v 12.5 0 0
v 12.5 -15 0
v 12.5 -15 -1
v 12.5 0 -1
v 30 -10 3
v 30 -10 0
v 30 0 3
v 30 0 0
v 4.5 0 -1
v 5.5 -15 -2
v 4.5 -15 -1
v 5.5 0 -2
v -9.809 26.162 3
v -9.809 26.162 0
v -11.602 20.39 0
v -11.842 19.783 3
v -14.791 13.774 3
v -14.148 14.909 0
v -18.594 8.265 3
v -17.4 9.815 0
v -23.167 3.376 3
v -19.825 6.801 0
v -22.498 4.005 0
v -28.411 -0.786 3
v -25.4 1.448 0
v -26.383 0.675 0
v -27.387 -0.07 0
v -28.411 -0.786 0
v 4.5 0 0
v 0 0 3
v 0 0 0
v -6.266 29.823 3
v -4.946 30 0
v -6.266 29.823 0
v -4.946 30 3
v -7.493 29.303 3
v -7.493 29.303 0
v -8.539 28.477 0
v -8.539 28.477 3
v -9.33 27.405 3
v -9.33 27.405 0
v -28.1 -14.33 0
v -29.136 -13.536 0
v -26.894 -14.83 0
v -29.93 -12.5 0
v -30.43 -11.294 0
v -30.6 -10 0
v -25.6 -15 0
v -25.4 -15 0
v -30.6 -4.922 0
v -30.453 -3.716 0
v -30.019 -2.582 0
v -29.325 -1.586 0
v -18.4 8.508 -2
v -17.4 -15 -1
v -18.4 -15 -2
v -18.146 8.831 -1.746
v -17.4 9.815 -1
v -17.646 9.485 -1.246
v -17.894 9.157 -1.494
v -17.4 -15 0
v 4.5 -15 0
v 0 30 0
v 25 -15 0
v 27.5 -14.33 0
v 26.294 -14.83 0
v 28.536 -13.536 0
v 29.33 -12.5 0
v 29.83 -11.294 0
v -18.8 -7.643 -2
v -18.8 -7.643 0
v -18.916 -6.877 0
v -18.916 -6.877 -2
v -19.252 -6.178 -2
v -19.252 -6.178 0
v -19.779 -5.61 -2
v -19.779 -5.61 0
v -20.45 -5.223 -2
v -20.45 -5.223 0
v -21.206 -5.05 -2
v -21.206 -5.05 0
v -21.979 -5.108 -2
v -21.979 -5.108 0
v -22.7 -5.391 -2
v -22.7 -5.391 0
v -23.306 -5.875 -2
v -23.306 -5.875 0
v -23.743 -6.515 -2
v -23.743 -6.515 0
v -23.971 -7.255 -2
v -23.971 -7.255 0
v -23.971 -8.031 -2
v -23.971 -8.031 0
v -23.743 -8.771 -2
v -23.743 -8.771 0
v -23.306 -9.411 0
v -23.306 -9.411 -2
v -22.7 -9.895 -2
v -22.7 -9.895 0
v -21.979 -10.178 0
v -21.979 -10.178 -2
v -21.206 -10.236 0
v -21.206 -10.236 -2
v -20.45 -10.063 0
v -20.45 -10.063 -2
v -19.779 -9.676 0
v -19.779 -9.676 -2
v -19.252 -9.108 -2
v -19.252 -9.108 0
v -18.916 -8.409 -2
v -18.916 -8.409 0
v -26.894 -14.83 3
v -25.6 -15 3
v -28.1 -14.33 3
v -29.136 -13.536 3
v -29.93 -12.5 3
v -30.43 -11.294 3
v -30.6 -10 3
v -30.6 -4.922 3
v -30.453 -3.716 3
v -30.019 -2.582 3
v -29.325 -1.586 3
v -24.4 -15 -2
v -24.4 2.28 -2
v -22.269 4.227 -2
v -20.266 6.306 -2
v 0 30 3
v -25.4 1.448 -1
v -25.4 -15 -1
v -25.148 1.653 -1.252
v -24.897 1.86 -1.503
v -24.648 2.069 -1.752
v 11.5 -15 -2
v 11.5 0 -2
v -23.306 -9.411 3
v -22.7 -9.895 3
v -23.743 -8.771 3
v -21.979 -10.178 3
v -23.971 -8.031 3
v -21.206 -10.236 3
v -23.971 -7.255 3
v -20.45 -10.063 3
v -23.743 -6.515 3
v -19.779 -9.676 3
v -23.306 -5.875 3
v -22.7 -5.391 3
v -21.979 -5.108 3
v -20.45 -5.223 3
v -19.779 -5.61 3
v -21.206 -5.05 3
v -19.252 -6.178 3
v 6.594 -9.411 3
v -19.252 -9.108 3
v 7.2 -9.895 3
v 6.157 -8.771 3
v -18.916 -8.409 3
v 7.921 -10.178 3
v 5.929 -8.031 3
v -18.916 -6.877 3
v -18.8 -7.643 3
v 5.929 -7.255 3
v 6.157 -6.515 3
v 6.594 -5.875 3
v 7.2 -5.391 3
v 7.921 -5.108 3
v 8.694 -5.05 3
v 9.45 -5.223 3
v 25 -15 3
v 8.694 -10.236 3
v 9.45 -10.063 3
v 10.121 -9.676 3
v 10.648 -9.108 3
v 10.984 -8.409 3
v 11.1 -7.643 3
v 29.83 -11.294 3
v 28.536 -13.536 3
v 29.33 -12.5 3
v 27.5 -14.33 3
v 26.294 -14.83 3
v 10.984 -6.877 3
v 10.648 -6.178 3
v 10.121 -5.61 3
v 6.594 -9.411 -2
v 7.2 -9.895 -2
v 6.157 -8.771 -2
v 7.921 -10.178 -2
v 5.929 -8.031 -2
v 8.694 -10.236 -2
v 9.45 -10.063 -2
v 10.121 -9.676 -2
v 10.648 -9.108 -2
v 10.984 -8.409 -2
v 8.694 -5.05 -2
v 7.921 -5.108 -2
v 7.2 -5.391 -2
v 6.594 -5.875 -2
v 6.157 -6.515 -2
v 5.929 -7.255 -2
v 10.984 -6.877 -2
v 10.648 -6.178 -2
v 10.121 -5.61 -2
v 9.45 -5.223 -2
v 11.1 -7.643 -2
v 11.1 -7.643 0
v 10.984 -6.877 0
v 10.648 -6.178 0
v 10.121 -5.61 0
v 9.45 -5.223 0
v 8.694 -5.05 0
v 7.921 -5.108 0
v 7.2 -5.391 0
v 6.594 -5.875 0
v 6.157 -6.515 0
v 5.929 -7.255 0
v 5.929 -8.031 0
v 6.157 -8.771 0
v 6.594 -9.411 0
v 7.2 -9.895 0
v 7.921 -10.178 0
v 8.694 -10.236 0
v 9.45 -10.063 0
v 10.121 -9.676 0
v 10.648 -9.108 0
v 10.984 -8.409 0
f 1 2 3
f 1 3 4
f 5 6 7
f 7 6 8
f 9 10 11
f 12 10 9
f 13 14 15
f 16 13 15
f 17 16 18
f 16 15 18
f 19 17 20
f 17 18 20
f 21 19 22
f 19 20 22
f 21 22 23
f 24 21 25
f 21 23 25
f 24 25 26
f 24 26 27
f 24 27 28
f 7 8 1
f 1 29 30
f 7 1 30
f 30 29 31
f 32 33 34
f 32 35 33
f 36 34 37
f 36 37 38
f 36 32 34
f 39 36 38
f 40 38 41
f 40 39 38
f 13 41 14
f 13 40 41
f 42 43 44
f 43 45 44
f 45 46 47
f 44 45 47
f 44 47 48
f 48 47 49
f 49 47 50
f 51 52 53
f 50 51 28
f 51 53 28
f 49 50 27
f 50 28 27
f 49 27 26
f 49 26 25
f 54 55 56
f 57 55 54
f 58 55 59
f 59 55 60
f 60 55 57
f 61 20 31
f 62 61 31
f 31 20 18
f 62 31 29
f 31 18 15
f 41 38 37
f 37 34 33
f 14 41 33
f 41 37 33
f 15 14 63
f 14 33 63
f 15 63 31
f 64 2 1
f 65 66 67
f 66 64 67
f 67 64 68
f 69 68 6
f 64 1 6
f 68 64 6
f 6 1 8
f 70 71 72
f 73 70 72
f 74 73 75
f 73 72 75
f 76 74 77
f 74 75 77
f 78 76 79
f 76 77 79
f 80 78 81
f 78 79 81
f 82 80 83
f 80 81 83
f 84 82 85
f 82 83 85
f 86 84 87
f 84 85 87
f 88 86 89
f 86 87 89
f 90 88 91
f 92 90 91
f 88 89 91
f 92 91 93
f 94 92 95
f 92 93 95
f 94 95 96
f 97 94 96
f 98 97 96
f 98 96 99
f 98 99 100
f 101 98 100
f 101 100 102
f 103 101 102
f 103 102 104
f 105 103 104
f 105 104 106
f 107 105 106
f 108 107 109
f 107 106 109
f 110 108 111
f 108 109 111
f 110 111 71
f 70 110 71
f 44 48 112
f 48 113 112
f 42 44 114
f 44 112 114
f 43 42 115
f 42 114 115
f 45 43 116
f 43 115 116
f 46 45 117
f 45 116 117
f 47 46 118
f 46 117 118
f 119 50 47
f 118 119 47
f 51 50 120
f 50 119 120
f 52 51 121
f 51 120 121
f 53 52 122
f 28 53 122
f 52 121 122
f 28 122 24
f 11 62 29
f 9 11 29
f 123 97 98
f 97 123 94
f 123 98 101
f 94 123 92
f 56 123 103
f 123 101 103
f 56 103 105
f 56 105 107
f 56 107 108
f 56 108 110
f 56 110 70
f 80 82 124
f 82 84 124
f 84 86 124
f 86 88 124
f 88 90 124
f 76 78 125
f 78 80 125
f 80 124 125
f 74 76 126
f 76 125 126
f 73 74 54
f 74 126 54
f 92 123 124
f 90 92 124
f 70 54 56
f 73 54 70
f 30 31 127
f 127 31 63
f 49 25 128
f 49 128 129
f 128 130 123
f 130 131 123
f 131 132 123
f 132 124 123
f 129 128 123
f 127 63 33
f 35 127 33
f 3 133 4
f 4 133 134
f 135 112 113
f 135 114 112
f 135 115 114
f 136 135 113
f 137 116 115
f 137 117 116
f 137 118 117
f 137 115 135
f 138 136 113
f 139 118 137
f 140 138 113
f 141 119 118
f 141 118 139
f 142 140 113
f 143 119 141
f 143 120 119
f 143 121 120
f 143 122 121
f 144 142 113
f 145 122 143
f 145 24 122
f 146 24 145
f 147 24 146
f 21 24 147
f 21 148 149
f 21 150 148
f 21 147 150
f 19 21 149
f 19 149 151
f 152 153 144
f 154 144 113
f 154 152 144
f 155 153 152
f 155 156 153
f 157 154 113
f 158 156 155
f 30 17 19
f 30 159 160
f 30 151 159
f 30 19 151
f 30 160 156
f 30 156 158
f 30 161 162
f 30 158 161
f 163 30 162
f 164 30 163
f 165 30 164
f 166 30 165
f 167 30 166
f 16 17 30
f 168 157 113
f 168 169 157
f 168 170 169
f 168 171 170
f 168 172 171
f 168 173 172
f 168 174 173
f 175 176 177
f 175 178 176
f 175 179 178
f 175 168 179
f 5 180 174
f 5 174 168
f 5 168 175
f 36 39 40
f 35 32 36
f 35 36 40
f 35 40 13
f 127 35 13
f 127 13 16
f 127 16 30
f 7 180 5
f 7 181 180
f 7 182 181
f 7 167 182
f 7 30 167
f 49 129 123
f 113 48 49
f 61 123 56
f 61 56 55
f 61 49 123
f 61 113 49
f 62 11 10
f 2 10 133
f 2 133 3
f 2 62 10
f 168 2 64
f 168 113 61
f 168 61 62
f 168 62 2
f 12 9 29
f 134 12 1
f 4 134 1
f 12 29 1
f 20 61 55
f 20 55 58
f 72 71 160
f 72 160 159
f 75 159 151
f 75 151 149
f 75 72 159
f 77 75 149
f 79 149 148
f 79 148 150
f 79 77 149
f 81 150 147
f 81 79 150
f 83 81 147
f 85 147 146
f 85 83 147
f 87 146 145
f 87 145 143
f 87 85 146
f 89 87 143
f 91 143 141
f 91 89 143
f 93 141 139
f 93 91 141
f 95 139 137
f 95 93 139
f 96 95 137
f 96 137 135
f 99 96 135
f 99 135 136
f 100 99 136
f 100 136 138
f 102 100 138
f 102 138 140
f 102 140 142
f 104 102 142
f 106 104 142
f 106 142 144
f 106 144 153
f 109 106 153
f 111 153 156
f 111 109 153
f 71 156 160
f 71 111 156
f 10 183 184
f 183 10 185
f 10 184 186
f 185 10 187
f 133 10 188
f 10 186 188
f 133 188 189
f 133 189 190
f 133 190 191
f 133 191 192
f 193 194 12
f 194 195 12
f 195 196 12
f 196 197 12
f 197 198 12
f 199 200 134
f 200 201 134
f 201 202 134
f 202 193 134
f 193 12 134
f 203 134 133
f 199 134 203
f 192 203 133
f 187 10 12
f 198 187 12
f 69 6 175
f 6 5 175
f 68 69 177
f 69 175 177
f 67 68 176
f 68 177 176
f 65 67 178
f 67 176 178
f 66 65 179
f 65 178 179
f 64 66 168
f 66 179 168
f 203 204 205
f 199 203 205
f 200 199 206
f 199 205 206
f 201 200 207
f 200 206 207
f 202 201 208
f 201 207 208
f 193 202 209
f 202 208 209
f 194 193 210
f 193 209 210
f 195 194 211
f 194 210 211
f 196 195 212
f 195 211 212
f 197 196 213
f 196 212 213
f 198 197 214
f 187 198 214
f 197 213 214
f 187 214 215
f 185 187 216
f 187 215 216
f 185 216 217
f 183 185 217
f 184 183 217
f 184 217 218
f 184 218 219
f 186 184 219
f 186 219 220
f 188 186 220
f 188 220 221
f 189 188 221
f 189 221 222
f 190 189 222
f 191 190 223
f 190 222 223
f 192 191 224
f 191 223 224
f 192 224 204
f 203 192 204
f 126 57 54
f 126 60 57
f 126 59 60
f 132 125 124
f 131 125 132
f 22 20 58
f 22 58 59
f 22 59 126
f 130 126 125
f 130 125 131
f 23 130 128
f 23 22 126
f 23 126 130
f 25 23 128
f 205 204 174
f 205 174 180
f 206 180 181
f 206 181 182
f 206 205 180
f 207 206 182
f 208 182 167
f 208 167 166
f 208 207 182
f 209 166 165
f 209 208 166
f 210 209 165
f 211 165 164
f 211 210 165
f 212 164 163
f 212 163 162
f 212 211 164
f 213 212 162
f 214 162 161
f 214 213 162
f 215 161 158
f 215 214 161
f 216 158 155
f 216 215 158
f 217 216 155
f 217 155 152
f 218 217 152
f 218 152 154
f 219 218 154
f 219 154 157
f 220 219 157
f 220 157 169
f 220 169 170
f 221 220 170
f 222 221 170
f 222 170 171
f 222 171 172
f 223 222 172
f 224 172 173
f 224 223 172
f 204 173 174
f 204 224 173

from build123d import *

# Parameters (mm, degrees)
F0_R     = 2.6
F1_DEPTH = 3
F2_R     = 5
F3_R     = 2.6
F3_W     = 8
F3_H     = 15
F4_DEPTH = 2
F5_SIZE  = 1


with BuildPart() as f1:
    # F0 (on Top) → F1 (new body)
    with BuildSketch(Plane.XY):
        with BuildLine():
            Line((30, 0), (0, 0))
            Line((0, 0), (0, 30))
            Line((0, 30), (-9.065466, 30))
            ThreePointArc((-9.065466, 30), (-16.222051, 11.49184), (-30.6, -2.184537))
            Line((-30.6, -2.184537), (-30.6, -15))
            Line((-30.6, -15), (30, -15))
            Line((30, -15), (30, 0))
        make_face()
        with Locations((-21.4, -7.643007)):
            Circle(F0_R, mode=Mode.SUBTRACT)
        with Locations((8.5, -7.643007)):
            Circle(F0_R, mode=Mode.SUBTRACT)
    extrude(amount=F1_DEPTH)

    # F2
    f2_edges = [f1.edges().sort_by_distance(p)[0] for p in [
        (-30.6, -15, 1.5),
        (-30.6, -2.184537, 1.5),
        (30, -15, 1.5),
        (-9.065466, 30, 1.5),
    ]]
    fillet(f2_edges, radius=F2_R)

    # F3 (on face) → F4 (join)
    with BuildSketch(Plane.XY):
        with BuildLine():
            Line((-25.4, 1.447635), (-25.4, -15))
            Line((-25.4, -15), (-17.4, -15))
            Line((-17.4, -15), (-17.4, 9.814667))
            ThreePointArc((-17.4, 9.814667), (-21.131748, 5.374666), (-25.4, 1.447635))
        make_face()
        with Locations((-21.4, -7.643007)):
            Circle(F3_R, mode=Mode.SUBTRACT)
        with Locations((8.5, -7.5)):
            Rectangle(F3_W, F3_H)
        with Locations((8.5, -7.643007)):
            Circle(F3_R, mode=Mode.SUBTRACT)
    extrude(amount=-F4_DEPTH)

    # F5
    f5_edges = [f1.edges().sort_by_distance(p)[0] for p in [
        (-25.4, -6.776183, -2),
        (-17.4, -2.592667, -2),
        (4.5, -7.5, -2),
        (12.5, -7.5, -2),
    ]]
    chamfer(f5_edges, length=F5_SIZE)


solid = f1.part
